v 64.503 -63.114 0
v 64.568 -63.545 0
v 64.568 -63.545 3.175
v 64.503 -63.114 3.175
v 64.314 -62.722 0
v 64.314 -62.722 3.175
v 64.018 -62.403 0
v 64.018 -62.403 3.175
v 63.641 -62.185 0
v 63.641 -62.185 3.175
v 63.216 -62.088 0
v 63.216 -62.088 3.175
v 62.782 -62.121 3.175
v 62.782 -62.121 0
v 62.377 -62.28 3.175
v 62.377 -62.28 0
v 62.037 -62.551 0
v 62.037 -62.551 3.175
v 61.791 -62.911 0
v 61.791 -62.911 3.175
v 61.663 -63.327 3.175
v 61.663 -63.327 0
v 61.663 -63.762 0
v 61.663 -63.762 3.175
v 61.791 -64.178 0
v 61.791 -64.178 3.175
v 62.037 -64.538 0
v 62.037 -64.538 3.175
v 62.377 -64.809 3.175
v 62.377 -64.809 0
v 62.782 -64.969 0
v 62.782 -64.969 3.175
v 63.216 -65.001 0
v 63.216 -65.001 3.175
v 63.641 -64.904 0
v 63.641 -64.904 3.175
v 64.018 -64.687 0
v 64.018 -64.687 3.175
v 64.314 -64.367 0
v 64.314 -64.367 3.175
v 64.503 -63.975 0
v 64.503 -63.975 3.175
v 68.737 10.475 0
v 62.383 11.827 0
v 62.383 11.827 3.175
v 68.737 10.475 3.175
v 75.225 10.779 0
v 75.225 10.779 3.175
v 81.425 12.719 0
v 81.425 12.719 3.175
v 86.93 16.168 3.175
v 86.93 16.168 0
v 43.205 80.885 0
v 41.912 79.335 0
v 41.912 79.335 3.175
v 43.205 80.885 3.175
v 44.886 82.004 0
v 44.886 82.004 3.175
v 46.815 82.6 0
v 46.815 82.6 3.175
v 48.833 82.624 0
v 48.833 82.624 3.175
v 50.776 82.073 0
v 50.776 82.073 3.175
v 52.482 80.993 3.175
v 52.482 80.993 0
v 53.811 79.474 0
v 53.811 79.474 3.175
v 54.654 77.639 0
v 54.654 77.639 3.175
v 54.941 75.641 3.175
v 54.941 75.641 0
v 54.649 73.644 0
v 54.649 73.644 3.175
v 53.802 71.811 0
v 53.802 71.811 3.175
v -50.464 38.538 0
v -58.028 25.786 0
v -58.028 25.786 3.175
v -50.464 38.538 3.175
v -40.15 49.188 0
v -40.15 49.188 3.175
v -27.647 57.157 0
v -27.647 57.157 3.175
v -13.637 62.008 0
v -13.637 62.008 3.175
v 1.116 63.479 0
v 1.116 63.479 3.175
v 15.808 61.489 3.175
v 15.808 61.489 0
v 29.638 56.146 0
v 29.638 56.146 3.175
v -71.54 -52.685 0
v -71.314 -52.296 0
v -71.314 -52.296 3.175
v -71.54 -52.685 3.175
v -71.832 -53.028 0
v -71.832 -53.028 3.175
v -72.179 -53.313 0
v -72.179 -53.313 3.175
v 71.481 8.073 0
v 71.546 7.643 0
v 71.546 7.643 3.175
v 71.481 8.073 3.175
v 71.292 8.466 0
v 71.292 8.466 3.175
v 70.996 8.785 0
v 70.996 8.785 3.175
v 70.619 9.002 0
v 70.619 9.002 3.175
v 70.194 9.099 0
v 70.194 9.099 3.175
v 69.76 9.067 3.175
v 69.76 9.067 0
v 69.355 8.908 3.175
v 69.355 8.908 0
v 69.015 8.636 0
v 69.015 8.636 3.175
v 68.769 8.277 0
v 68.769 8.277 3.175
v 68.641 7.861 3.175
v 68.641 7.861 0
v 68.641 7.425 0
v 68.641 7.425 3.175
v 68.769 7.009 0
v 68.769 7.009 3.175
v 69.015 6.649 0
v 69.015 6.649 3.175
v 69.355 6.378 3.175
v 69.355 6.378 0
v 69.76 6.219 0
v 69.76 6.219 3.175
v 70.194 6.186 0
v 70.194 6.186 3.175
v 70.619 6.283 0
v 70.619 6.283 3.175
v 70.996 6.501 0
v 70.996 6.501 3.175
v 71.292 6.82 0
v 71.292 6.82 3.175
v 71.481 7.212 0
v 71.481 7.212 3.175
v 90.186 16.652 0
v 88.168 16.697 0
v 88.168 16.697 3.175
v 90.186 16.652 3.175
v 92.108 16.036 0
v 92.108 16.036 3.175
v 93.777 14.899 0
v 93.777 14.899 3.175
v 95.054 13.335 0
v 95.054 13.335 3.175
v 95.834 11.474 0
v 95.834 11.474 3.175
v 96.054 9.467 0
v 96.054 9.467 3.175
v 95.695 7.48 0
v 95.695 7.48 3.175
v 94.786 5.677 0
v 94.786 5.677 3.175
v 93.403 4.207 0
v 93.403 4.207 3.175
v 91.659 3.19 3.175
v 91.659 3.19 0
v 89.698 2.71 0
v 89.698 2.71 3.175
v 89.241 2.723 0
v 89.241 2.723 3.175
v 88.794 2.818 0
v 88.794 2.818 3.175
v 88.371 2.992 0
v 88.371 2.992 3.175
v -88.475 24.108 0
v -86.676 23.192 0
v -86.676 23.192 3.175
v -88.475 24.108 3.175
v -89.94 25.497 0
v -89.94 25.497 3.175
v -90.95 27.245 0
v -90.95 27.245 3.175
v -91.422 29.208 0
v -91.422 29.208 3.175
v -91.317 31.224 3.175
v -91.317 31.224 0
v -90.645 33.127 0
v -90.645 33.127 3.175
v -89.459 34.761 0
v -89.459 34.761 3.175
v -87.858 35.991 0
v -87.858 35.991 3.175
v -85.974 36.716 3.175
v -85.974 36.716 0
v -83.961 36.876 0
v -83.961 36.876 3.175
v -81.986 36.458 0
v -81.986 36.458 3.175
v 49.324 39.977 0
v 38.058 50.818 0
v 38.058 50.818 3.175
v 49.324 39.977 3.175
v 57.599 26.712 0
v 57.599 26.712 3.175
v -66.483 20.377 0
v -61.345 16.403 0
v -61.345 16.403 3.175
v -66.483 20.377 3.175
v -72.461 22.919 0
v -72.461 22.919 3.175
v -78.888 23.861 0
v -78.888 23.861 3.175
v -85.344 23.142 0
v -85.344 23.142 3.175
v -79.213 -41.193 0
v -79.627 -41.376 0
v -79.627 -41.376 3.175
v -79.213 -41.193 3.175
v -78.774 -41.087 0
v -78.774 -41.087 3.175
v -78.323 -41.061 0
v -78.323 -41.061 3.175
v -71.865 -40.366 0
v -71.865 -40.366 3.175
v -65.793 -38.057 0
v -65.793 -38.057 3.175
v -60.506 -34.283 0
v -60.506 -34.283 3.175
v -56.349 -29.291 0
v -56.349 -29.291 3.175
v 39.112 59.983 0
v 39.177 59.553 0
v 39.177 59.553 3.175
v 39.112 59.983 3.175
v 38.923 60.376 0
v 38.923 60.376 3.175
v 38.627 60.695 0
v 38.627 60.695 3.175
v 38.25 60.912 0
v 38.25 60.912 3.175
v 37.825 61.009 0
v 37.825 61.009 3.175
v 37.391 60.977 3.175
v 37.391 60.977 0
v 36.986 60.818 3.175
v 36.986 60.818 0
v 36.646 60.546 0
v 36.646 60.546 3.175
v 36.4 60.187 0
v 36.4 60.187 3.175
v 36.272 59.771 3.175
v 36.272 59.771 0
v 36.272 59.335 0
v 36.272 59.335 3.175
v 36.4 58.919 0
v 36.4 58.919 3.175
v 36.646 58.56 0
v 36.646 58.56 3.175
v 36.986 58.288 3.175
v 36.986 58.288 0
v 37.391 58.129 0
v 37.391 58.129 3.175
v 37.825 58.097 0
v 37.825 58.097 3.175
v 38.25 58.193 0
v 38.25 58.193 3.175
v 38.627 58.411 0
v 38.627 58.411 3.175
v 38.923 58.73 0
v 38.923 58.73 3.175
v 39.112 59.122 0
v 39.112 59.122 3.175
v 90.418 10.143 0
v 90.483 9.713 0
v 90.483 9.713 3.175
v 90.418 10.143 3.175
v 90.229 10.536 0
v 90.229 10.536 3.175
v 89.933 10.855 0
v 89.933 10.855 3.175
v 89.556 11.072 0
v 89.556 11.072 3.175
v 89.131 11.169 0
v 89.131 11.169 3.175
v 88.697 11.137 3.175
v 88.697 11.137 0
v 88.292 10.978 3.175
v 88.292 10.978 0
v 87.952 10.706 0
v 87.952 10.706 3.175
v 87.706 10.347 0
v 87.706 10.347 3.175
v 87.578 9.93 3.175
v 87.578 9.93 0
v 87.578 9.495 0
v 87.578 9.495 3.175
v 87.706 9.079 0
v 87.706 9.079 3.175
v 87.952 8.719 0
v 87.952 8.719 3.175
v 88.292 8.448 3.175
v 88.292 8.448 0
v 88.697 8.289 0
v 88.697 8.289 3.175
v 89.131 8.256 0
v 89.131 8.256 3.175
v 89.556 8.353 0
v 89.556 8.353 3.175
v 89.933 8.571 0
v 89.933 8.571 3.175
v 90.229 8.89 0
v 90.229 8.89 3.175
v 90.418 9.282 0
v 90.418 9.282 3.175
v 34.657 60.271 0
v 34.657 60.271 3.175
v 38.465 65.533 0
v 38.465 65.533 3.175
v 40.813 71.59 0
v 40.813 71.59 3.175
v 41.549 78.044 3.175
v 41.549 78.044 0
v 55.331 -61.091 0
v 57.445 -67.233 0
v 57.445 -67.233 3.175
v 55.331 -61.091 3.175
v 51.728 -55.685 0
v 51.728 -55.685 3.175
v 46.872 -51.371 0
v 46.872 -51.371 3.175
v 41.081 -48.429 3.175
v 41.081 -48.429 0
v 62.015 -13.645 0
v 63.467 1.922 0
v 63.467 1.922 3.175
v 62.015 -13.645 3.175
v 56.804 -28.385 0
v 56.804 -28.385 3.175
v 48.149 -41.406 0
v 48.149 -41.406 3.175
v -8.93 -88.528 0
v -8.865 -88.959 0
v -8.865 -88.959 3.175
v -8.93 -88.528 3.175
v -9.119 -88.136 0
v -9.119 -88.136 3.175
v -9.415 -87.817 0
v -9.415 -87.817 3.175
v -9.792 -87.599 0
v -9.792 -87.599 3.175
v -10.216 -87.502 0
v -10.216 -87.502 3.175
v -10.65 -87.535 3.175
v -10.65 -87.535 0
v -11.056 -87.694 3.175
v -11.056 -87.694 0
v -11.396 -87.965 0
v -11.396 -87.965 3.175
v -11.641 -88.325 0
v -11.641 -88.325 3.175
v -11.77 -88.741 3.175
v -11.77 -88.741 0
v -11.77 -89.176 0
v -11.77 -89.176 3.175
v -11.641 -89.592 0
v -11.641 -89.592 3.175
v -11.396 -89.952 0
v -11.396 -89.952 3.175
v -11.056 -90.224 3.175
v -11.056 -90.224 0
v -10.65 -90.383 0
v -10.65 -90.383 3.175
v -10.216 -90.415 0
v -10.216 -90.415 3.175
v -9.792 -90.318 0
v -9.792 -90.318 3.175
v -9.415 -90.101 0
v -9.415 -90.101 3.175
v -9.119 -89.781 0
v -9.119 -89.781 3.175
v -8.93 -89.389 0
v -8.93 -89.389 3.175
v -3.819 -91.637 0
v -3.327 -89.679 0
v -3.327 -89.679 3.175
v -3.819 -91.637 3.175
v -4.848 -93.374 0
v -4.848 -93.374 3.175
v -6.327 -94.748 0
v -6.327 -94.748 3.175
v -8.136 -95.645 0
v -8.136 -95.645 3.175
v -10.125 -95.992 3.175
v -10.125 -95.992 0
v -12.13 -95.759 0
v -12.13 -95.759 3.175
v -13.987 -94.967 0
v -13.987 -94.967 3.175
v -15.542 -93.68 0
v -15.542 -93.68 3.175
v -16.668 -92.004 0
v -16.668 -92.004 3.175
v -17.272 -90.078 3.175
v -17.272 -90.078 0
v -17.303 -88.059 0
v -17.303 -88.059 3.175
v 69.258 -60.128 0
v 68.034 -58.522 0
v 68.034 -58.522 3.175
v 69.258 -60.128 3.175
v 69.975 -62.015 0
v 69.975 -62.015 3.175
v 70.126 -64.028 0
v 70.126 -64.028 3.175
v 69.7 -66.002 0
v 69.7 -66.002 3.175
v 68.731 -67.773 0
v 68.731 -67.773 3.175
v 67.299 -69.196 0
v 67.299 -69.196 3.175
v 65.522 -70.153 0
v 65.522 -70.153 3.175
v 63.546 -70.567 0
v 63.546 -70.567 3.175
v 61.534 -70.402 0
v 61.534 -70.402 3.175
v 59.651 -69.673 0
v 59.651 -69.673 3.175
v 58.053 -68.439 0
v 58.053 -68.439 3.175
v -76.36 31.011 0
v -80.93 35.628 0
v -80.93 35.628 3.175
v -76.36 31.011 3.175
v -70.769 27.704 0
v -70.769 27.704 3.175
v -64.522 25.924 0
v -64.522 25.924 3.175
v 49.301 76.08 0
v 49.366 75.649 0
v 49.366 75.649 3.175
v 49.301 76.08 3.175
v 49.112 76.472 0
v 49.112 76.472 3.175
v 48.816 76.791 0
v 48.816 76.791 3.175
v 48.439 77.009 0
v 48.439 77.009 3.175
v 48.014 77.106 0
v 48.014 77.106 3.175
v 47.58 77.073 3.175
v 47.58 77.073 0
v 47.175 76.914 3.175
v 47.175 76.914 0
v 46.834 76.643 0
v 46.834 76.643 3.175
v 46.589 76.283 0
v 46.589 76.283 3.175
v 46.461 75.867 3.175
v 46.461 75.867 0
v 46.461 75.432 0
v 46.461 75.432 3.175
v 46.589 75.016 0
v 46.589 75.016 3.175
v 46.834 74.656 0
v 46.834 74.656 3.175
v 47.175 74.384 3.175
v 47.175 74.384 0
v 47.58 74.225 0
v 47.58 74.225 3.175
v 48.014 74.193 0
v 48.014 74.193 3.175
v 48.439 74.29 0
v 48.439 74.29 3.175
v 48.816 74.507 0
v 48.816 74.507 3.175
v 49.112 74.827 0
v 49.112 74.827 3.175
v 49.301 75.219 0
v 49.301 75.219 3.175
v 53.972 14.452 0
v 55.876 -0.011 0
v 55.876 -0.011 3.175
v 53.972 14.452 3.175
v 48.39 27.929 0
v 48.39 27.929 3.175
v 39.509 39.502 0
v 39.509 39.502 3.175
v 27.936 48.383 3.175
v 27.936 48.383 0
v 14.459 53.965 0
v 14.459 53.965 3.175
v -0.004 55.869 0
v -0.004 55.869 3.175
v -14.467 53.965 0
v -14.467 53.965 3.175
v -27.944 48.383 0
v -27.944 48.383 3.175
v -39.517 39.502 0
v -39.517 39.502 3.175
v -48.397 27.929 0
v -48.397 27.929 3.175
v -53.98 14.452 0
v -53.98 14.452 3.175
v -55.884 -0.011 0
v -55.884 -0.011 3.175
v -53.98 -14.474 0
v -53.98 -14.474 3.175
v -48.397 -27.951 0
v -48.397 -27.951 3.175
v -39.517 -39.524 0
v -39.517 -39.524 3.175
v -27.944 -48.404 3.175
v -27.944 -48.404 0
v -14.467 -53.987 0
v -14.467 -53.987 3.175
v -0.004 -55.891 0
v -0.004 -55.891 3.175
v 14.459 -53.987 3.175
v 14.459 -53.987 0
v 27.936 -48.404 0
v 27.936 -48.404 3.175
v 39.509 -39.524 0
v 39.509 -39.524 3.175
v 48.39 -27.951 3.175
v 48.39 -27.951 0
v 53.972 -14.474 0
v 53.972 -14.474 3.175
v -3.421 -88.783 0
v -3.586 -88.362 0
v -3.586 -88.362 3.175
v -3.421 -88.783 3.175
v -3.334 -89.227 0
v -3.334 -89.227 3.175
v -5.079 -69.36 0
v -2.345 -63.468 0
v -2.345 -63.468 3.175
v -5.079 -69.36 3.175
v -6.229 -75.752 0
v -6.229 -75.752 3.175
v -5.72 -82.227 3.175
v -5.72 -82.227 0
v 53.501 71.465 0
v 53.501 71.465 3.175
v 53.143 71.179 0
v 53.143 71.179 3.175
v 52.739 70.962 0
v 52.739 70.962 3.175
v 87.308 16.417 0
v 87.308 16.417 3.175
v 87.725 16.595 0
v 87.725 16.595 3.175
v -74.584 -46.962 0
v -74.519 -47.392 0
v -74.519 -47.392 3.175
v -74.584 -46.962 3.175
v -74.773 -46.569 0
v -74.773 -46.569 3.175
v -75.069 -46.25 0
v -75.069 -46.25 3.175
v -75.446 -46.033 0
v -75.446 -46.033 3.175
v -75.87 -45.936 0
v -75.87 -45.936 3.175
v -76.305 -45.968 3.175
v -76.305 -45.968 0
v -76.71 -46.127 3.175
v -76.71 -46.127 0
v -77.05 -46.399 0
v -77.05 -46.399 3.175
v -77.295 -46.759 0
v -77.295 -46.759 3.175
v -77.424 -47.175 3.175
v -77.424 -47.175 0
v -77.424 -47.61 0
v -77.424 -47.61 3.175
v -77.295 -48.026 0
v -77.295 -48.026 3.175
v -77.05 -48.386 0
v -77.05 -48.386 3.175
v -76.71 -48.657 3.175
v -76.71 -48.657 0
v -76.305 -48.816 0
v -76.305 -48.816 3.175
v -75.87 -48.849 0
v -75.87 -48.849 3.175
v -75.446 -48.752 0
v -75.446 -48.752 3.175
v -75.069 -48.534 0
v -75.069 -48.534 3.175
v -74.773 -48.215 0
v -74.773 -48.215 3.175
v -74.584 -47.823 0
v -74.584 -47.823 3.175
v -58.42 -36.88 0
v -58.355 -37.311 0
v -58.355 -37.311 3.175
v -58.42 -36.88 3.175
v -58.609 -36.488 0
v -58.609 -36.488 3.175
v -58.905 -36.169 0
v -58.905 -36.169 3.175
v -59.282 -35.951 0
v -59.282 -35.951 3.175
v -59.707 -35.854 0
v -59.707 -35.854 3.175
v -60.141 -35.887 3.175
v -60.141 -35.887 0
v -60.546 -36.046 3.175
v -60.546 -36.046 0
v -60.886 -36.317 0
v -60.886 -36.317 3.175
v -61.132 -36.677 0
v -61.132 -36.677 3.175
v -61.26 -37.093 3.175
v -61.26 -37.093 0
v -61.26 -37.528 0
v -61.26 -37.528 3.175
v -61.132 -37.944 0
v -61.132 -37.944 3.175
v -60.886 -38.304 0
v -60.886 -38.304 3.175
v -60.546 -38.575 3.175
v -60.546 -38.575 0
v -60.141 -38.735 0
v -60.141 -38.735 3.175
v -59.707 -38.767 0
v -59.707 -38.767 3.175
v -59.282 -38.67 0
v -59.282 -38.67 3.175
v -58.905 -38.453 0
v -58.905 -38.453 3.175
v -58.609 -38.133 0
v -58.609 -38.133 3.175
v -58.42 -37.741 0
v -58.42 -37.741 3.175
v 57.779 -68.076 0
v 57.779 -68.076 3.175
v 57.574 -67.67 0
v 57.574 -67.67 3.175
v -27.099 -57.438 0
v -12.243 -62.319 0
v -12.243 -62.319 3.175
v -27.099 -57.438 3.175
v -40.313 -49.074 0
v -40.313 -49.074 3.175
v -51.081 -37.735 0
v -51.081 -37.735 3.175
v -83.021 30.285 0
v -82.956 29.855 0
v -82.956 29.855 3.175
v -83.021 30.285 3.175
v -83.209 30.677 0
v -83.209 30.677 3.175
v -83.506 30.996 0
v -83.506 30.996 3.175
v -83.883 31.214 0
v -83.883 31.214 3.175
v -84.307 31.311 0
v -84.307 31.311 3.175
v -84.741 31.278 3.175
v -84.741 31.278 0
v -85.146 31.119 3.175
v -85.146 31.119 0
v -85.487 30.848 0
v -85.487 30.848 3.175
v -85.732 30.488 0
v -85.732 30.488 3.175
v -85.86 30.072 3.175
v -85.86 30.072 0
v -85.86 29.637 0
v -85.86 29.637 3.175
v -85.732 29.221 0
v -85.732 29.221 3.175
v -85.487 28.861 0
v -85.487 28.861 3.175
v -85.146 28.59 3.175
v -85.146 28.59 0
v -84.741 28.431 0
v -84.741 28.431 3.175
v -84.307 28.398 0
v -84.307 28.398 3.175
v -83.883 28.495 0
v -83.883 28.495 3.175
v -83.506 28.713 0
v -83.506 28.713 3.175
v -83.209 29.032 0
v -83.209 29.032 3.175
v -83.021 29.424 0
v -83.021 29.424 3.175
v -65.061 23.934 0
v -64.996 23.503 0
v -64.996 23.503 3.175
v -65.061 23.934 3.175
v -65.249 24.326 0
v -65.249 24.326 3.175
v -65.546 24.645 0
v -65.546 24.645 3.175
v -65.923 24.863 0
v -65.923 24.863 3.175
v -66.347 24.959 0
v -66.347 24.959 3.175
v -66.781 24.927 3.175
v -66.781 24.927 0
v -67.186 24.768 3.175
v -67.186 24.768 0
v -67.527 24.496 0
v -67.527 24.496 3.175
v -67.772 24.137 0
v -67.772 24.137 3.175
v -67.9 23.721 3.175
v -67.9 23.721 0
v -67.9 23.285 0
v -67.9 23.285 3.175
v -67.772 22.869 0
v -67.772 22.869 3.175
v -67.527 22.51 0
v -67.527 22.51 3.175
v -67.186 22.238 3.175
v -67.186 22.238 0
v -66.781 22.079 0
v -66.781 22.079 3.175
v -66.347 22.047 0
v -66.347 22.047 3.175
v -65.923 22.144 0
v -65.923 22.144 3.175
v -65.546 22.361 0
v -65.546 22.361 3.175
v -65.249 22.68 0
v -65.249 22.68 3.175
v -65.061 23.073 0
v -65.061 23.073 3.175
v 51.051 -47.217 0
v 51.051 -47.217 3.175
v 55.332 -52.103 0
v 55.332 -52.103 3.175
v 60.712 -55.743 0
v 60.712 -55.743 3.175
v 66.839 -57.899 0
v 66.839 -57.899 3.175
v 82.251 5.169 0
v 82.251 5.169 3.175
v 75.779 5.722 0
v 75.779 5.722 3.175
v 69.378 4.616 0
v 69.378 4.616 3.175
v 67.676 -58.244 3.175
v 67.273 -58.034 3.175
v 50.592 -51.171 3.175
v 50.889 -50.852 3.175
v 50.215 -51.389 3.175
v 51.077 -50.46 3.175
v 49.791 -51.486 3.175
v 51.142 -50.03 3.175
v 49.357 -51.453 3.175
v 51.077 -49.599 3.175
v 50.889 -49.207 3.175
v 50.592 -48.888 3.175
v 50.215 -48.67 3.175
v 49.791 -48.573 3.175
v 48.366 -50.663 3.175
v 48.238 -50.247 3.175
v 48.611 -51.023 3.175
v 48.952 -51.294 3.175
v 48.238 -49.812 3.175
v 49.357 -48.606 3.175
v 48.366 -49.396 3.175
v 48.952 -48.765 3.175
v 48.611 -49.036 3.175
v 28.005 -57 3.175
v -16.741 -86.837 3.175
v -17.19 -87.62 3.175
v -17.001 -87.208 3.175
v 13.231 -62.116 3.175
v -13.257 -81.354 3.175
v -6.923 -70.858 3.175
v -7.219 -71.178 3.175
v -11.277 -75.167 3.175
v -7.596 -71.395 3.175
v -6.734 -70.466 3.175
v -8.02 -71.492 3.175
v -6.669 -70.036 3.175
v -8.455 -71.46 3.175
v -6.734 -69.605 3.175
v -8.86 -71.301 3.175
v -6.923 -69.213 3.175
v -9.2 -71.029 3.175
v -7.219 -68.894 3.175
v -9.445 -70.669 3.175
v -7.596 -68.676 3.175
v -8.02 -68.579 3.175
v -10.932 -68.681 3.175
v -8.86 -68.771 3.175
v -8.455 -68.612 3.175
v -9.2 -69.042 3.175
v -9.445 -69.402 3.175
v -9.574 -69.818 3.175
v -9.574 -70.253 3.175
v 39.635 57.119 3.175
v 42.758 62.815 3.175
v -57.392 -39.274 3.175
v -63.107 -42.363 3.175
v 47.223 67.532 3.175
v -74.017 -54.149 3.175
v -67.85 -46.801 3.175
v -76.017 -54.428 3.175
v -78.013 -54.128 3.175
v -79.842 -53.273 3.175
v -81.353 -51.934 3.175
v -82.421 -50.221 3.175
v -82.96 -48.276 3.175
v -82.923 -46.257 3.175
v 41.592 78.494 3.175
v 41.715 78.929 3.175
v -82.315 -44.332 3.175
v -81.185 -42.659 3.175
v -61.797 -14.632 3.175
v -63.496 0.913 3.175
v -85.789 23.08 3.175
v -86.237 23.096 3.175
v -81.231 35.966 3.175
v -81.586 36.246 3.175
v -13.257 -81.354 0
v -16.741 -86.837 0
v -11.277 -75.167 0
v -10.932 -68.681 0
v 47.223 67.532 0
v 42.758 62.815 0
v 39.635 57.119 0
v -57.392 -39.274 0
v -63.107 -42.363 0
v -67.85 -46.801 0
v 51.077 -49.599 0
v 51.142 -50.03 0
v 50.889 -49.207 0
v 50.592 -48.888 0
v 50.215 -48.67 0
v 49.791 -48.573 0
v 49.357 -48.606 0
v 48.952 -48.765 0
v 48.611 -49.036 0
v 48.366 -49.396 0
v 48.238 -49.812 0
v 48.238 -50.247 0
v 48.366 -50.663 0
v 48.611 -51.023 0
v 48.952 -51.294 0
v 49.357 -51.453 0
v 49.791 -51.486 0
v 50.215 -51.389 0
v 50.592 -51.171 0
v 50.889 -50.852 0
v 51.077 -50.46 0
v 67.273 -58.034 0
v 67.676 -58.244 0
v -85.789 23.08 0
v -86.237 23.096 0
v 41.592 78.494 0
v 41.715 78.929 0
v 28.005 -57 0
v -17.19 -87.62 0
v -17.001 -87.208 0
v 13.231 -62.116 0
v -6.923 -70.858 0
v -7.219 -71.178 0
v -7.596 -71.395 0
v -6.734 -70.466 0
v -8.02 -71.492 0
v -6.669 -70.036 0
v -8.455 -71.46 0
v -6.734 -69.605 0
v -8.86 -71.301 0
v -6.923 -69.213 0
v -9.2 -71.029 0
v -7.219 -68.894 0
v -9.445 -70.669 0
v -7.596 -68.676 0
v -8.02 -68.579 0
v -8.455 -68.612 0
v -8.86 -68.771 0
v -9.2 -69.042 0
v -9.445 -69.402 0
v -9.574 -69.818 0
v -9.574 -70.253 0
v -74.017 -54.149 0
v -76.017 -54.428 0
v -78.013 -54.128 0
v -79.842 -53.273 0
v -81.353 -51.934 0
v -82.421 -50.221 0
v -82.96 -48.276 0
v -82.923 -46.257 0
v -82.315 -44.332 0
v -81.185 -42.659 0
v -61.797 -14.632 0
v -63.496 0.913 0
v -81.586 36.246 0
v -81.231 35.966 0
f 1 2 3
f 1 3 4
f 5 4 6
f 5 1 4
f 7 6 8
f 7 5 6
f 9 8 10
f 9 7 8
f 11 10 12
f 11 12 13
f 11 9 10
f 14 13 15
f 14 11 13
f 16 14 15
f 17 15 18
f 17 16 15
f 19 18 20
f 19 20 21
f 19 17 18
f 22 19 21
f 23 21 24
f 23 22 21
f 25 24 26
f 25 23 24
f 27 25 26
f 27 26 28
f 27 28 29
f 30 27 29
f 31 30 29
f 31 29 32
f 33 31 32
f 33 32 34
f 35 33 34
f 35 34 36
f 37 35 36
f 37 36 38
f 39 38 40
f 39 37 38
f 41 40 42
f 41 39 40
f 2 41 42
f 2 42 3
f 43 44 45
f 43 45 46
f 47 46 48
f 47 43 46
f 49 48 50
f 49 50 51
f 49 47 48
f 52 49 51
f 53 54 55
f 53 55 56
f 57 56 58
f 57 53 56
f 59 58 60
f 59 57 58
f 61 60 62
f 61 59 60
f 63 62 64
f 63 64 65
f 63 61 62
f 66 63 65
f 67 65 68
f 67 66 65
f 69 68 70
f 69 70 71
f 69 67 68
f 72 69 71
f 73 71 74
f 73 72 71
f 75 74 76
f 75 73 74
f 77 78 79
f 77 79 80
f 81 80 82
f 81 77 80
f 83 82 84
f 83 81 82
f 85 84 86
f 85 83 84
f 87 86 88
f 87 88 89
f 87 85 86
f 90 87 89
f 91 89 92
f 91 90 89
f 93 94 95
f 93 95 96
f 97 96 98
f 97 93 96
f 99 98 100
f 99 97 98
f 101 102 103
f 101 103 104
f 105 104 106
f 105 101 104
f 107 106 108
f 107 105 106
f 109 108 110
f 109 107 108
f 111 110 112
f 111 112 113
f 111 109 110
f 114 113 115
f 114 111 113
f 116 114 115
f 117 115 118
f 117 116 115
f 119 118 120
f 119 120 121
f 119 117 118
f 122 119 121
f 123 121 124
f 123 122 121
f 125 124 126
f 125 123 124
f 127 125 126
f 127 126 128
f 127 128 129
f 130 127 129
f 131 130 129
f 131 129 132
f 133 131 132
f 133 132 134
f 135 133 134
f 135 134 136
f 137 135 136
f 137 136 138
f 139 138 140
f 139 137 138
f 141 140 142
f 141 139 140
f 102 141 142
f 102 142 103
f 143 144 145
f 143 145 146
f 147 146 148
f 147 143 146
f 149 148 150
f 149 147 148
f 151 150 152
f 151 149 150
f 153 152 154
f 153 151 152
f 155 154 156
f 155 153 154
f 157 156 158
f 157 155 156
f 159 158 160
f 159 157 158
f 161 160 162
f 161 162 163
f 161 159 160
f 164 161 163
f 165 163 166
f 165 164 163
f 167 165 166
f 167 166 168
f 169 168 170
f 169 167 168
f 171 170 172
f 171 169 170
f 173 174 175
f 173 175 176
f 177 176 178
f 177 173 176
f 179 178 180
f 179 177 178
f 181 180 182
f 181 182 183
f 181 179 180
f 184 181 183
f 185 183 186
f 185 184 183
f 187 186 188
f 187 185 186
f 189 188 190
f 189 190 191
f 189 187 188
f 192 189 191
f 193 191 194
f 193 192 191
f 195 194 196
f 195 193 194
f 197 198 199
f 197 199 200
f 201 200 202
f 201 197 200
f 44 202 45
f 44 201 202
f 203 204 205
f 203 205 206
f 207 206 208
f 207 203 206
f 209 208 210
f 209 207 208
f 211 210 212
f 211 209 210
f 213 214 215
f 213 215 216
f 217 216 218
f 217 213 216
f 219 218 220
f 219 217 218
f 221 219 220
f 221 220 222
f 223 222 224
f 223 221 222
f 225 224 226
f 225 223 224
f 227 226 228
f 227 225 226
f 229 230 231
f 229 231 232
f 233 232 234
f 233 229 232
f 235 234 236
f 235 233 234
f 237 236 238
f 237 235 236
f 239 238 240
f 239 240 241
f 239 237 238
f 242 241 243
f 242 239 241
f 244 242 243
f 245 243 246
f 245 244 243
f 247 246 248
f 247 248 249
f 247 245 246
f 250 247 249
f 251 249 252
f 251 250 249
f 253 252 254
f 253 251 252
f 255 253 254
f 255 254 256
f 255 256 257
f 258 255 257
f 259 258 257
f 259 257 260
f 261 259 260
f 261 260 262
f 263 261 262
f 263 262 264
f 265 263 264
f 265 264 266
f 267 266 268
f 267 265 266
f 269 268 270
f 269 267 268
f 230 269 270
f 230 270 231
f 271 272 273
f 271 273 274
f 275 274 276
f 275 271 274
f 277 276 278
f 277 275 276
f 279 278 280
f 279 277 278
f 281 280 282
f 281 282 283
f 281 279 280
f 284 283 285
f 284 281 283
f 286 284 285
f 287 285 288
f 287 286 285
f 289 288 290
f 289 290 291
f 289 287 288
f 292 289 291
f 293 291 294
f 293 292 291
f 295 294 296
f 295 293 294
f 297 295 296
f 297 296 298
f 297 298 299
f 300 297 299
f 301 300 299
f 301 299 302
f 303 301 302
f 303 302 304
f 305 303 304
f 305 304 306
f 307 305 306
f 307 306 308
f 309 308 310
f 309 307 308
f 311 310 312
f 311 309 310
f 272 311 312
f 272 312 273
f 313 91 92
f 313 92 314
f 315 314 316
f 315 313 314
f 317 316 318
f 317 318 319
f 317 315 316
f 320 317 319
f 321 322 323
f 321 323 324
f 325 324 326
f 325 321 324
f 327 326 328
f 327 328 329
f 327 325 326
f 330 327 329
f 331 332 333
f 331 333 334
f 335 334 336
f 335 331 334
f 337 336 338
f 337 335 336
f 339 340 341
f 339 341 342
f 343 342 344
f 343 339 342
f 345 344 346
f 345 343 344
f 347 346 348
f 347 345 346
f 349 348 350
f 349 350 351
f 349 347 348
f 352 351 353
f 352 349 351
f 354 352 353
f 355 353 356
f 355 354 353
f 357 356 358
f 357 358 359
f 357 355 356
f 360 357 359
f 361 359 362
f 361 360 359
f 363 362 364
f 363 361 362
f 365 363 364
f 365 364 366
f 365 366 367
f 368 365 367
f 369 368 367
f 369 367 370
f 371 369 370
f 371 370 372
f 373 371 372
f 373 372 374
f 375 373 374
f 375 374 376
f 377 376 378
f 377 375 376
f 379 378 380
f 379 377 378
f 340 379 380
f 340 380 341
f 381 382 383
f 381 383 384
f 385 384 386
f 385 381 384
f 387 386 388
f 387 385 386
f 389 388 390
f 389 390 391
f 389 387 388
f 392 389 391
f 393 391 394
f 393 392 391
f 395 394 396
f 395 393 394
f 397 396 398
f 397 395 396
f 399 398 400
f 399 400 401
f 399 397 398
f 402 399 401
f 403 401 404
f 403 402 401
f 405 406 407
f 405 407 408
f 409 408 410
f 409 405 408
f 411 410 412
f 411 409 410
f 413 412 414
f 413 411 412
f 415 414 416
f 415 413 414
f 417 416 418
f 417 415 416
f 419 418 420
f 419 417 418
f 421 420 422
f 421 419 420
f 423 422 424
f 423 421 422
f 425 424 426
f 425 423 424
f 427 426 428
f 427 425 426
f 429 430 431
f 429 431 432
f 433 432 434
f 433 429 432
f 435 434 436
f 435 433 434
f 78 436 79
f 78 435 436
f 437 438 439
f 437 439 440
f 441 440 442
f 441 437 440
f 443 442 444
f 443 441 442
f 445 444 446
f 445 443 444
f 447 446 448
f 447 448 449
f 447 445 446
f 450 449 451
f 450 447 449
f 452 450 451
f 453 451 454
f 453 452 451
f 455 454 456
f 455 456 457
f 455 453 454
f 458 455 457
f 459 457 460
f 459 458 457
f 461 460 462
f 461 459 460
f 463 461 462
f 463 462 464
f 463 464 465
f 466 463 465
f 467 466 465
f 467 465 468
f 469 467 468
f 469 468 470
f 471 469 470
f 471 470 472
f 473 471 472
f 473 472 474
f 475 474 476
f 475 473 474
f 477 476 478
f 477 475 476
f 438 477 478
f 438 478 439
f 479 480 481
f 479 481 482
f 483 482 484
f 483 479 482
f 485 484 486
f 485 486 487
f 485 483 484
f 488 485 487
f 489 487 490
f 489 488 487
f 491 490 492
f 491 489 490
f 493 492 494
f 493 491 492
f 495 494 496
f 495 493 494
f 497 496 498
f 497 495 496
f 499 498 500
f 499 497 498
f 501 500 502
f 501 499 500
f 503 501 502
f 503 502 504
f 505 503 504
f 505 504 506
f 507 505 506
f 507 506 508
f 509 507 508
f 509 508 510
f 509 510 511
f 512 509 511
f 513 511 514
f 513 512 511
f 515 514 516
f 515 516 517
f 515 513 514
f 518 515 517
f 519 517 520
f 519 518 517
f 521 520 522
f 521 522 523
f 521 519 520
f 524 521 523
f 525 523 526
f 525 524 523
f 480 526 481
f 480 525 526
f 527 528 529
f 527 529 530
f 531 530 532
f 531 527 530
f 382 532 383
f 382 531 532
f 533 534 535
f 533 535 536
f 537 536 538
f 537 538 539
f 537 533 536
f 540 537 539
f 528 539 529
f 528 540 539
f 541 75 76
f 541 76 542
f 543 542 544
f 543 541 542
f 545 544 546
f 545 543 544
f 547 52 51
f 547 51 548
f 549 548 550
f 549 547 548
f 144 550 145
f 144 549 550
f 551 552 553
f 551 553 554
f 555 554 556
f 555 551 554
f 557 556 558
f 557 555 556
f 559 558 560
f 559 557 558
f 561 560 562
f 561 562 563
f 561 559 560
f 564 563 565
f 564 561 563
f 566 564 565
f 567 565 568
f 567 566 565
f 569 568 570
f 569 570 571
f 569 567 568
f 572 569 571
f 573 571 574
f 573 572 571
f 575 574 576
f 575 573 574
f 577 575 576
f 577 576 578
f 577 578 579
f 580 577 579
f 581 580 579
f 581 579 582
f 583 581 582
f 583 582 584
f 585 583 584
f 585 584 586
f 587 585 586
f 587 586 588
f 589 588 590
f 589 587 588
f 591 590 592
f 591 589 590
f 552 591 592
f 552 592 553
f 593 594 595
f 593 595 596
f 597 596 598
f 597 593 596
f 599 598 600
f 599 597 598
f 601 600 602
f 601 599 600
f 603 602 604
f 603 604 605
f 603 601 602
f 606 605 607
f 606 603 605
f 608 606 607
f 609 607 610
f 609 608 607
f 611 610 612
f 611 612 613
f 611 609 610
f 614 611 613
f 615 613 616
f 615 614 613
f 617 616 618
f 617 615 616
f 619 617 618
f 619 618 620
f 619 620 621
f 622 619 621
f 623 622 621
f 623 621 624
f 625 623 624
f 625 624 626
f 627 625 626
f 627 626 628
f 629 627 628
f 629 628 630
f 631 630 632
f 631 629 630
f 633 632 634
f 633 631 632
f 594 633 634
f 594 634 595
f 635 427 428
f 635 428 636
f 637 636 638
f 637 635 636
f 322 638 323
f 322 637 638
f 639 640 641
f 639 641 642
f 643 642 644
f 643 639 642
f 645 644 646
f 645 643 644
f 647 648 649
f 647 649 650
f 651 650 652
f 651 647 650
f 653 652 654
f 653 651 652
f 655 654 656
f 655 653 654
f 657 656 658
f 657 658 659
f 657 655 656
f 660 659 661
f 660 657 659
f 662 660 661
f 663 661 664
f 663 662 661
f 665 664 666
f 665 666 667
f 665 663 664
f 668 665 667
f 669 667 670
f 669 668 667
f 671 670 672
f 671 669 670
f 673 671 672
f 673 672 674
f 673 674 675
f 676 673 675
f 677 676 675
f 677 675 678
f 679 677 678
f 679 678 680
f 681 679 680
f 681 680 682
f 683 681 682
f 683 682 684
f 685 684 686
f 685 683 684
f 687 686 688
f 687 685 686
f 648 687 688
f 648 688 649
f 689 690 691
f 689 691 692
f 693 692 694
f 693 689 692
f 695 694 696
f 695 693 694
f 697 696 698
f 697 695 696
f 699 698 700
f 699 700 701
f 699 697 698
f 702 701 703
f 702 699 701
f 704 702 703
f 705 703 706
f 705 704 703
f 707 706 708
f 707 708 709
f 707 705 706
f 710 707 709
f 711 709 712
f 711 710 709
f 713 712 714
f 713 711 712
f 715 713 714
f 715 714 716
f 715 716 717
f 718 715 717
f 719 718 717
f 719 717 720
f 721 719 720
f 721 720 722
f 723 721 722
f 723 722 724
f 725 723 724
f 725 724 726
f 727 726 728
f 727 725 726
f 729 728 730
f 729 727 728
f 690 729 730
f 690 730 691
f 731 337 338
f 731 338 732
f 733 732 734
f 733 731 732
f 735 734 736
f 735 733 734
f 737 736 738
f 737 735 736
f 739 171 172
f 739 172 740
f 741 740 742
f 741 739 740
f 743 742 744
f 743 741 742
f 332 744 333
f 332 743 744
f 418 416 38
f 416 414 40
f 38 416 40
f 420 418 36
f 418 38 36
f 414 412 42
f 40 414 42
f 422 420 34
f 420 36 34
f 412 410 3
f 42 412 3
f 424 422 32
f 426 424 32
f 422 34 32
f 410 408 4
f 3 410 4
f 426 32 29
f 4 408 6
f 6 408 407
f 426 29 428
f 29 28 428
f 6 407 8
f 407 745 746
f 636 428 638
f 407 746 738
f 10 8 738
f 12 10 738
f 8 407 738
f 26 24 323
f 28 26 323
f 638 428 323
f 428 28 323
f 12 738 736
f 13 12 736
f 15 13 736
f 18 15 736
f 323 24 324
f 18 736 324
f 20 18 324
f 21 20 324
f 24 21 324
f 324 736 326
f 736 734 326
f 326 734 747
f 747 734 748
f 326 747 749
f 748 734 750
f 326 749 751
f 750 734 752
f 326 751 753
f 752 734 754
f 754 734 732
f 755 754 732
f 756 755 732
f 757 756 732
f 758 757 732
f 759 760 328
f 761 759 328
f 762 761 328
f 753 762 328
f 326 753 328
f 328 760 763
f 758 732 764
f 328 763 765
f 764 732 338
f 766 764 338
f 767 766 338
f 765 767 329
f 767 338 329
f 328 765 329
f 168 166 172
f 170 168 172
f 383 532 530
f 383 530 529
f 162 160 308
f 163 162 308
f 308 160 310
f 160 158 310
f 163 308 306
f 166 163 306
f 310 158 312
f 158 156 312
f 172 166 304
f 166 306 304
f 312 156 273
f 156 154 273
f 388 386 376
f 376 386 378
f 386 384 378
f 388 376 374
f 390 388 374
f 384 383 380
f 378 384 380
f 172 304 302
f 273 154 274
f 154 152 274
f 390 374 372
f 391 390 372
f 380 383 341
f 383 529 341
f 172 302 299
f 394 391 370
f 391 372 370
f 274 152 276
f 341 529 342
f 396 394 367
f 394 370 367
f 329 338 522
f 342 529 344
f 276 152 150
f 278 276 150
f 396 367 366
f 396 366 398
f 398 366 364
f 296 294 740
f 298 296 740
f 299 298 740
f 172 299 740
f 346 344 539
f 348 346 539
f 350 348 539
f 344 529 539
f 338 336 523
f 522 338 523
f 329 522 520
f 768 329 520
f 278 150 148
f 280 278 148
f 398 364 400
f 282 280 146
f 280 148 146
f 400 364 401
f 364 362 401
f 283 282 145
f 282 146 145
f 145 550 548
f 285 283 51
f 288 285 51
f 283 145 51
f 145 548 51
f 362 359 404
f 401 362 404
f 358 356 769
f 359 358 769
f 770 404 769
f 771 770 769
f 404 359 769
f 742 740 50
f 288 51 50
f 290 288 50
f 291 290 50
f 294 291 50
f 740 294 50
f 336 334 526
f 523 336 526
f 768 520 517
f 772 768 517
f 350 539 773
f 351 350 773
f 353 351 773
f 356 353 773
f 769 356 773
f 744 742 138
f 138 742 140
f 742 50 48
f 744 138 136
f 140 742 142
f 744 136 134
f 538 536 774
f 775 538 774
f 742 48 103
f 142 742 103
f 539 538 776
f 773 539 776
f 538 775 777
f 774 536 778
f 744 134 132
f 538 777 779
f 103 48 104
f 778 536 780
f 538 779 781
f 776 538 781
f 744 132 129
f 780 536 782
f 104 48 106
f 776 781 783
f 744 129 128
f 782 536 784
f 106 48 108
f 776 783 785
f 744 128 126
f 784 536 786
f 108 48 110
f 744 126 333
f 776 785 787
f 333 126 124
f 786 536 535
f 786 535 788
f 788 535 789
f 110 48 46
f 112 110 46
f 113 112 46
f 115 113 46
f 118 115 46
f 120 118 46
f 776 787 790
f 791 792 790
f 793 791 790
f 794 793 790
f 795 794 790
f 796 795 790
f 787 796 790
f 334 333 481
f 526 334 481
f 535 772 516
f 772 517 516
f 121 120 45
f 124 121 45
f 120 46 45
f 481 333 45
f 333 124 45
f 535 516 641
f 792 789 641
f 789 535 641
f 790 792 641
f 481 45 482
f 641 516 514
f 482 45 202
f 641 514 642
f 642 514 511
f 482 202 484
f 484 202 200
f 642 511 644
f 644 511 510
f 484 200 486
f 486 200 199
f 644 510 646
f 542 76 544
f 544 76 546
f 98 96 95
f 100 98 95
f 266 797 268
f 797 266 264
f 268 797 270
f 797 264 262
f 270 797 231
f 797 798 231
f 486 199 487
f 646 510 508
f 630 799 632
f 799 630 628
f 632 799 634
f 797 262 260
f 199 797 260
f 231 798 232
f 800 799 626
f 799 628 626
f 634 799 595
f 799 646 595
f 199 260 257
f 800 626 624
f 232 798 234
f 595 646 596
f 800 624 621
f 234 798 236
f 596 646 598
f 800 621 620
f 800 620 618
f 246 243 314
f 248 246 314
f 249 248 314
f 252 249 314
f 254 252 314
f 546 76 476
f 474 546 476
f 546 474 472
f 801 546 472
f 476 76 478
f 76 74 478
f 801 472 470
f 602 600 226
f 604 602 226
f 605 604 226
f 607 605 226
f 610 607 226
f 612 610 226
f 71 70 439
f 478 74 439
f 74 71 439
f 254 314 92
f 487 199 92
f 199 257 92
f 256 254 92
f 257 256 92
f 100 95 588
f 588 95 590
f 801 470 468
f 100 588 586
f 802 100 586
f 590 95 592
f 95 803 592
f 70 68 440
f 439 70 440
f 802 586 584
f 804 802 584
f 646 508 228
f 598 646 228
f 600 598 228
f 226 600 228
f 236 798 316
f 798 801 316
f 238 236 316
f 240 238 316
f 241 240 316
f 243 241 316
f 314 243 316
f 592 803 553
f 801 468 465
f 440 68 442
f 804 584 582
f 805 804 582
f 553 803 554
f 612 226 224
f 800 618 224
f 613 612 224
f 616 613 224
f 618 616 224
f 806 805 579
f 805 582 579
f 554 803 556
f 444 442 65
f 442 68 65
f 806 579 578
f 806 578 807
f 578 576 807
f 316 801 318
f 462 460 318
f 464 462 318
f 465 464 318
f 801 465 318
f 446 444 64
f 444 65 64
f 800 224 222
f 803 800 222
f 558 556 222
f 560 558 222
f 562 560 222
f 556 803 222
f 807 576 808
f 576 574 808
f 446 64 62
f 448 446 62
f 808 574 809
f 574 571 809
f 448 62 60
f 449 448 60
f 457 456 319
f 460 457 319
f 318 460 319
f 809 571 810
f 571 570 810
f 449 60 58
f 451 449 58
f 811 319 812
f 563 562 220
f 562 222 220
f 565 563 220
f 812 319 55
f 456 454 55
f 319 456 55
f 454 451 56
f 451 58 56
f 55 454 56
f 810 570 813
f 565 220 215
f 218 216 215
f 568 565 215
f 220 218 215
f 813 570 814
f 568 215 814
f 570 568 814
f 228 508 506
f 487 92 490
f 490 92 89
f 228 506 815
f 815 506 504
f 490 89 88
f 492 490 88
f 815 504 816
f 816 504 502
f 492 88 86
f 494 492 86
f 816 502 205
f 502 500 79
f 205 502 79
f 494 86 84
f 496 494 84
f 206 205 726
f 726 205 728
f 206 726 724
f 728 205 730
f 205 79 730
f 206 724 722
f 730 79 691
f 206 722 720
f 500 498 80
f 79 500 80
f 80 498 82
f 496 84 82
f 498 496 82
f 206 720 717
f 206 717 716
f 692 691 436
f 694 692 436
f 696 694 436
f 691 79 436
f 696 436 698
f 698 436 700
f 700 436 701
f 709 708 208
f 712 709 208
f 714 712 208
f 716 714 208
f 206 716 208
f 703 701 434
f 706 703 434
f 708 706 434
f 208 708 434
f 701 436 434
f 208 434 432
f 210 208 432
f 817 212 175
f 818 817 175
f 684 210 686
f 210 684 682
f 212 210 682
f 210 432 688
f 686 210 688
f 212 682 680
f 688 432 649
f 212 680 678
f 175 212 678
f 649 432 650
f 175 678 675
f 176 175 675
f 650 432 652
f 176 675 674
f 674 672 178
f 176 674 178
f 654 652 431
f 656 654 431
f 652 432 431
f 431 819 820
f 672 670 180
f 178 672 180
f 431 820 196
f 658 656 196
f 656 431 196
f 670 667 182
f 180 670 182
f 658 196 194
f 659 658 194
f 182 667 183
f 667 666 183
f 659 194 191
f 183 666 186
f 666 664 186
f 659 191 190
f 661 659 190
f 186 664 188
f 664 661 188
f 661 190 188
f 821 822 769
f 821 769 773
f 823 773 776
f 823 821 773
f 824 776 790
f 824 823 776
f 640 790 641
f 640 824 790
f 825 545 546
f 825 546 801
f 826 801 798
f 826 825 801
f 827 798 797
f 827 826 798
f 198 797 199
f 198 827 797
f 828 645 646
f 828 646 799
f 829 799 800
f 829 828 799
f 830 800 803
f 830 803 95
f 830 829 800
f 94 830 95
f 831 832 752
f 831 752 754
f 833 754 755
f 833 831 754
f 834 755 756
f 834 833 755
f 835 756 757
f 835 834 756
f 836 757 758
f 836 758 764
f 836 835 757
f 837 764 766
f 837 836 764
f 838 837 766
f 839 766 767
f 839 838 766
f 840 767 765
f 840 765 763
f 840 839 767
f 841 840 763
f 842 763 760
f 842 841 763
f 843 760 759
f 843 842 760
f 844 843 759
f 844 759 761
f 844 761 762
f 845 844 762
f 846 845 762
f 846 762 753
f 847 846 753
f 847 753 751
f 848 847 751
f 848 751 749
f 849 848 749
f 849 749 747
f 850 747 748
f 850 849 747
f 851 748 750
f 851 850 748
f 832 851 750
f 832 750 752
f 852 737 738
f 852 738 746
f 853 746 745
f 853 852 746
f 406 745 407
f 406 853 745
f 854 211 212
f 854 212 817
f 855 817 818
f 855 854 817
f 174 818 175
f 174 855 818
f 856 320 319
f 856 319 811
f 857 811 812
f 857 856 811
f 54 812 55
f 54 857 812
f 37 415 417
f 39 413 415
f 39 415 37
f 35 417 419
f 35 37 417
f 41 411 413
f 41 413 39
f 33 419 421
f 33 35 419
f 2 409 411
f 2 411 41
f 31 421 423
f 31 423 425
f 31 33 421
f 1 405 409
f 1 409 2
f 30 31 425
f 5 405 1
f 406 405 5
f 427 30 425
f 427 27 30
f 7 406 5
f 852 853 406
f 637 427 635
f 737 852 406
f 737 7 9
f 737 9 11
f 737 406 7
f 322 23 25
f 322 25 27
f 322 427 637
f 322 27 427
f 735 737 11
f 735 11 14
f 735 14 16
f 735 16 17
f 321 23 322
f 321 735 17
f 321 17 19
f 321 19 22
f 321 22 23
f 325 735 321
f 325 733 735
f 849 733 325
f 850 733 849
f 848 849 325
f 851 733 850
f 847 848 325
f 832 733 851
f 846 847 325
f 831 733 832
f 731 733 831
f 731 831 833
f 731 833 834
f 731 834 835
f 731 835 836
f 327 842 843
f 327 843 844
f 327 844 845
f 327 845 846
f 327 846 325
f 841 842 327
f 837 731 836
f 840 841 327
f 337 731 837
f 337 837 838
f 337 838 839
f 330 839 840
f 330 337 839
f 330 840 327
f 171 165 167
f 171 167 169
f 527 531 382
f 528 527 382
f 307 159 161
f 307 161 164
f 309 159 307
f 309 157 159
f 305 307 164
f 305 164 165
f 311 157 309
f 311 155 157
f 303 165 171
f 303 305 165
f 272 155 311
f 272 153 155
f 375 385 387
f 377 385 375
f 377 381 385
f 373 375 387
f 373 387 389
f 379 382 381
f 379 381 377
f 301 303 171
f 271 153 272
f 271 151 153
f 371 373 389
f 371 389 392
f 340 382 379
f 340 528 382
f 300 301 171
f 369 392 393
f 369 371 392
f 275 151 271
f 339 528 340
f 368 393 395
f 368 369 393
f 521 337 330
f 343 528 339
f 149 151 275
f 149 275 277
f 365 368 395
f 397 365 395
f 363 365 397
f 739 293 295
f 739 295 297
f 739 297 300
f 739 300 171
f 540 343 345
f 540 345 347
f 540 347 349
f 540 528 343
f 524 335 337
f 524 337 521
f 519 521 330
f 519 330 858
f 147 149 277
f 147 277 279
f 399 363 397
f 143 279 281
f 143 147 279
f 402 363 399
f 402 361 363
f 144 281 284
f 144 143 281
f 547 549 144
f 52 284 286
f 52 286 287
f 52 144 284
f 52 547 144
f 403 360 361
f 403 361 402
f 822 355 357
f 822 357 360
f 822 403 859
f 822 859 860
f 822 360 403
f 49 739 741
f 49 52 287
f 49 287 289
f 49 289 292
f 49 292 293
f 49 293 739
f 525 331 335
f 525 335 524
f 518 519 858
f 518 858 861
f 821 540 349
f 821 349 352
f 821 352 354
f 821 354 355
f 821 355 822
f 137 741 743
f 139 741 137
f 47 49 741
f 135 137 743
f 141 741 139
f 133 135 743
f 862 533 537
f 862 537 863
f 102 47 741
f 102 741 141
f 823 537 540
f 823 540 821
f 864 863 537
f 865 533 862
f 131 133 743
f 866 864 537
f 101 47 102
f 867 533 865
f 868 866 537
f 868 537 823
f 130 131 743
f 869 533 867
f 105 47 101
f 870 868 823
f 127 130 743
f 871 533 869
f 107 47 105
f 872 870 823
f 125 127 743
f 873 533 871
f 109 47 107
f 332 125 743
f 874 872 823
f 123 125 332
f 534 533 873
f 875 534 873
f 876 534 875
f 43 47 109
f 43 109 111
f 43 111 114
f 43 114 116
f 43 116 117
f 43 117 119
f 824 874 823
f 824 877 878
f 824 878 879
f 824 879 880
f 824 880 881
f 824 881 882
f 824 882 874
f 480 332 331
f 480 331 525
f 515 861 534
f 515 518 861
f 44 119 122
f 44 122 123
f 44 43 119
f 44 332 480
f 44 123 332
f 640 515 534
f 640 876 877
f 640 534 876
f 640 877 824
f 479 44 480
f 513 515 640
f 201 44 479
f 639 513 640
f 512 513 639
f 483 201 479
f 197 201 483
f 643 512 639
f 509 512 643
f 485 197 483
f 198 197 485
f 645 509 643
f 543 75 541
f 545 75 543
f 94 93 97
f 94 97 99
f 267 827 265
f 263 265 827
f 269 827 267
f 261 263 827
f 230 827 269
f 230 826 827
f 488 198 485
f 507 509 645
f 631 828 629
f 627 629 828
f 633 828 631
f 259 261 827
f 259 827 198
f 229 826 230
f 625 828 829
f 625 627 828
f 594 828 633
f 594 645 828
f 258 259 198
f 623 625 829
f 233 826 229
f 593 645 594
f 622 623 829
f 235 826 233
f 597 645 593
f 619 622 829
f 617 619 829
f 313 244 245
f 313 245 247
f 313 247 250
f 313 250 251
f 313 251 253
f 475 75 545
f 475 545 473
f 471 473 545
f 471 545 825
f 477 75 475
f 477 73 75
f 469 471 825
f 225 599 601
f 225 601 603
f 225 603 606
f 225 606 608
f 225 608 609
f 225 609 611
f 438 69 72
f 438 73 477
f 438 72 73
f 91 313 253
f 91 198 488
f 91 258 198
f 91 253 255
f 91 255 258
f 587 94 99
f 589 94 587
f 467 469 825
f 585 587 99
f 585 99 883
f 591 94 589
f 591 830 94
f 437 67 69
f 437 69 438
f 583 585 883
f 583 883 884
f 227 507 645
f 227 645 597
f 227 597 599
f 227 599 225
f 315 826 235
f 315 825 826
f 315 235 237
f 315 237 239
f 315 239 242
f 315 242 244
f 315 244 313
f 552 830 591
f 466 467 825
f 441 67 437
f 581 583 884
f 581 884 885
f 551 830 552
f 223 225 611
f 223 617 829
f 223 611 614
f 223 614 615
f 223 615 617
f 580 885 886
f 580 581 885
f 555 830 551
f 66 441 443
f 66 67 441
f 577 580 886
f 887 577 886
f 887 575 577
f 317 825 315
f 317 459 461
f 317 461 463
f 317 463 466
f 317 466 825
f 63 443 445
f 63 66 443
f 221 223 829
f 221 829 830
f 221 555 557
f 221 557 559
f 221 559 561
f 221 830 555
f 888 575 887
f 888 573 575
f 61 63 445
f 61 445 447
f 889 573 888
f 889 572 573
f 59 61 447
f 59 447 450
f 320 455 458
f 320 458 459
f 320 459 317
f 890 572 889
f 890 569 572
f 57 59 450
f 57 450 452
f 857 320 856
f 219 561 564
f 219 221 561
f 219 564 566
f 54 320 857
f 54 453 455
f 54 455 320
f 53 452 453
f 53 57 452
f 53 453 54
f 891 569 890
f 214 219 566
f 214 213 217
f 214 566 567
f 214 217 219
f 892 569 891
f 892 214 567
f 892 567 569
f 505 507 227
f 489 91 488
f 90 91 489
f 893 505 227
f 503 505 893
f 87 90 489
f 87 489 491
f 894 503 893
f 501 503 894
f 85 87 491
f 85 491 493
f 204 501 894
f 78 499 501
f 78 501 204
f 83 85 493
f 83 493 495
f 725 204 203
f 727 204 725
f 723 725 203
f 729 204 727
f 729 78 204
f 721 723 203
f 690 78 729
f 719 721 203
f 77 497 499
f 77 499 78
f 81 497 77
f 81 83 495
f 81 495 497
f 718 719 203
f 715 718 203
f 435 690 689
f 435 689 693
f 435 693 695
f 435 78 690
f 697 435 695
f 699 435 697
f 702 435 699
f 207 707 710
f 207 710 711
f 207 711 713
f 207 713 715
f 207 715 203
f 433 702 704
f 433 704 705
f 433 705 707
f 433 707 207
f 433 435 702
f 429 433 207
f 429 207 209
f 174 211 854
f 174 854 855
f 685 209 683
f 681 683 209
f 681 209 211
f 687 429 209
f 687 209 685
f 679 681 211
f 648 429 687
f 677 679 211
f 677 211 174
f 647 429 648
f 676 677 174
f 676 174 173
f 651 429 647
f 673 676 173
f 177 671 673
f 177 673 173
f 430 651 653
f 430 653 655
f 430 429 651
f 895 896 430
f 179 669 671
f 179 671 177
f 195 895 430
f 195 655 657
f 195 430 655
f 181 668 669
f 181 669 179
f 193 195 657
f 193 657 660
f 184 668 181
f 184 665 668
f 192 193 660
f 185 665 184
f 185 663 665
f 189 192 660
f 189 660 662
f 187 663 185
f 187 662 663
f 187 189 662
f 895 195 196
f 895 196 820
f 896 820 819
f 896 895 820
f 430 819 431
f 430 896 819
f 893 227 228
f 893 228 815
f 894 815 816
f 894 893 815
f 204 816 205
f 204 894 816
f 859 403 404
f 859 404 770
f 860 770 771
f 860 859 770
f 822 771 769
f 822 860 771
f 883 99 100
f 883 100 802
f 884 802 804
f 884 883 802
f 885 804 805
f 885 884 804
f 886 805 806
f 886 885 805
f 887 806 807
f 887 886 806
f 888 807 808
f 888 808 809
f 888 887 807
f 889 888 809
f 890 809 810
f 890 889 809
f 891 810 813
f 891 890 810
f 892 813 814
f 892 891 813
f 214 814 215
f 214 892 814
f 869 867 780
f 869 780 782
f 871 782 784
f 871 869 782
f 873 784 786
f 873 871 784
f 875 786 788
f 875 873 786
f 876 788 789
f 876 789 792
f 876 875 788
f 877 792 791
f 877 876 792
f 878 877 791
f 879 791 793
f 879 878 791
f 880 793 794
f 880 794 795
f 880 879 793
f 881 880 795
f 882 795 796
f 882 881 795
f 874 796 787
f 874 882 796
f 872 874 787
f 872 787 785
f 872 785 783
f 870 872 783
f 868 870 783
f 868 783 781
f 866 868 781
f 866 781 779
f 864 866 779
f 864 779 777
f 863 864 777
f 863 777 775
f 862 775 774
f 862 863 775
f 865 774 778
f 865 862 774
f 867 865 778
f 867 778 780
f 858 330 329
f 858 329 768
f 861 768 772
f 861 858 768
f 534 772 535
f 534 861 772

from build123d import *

# Parameters (mm, degrees)
SKETCH1_R           = 1.4605
SKETCH1_R_2         = 55.88
BOSS_EXTRUDE1_DEPTH = 3.175


with BuildPart() as part:
    # Sketch1 → Boss-Extrude1 (new body)
    with BuildSketch(Plane.XY):
        with BuildLine():
            ThreePointArc((88.371221891, 2.992104588), (75.778671602, 5.722307778), (63.466706043, 1.922066166))
            ThreePointArc((63.466706043, 1.922066166), (59.865004486, -21.176198252), (48.149108175, -41.405875631))
            ThreePointArc((48.149108175, -41.405875631), (55.331871693, -52.10275973), (66.839271225, -57.898894408))
            ThreePointArc((66.839271225, -57.898894408), (67.47896866, -58.129774903), (68.034473997, -58.522117141))
            ThreePointArc((68.034473997, -58.522117141), (68.066383731, -68.535675481), (58.053237429, -68.439394687))
            ThreePointArc((58.053237429, -68.439394687), (57.667420479, -67.877380582), (57.444971188, -67.232996469))
            ThreePointArc((57.444971188, -67.232996469), (51.728203311, -55.685490362), (41.080669811, -48.429019967))
            ThreePointArc((41.080669811, -48.429019967), (20.776095309, -60.014628604), (-2.344845215, -63.467769564))
            ThreePointArc((-2.344845215, -63.467769564), (-6.228950943, -75.752050976), (-3.586132247, -88.361783585))
            ThreePointArc((-3.586132247, -88.361783585), (-3.36770111, -89.003157809), (-3.32660045, -89.679459363))
            ThreePointArc((-3.32660045, -89.679459363), (-11.135620218, -95.947758903), (-17.303439466, -88.059135792))
            ThreePointArc((-17.303439466, -88.059135792), (-17.104674606, -87.410023107), (-16.741077367, -86.836741505))
            ThreePointArc((-16.741077367, -86.836741505), (-11.27722002, -75.167440106), (-12.242511565, -62.318527916))
            ThreePointArc((-12.242511565, -62.318527916), (-33.964407462, -53.664473517), (-51.081326085, -37.735113336))
            ThreePointArc((-51.081326085, -37.735113336), (-63.106619809, -42.363141327), (-71.313643792, -52.296473576))
            ThreePointArc((-71.313643792, -52.296473576), (-71.67843667, -52.862852869), (-72.179293677, -53.313409866))
            ThreePointArc((-72.179293677, -53.313409866), (-81.948891787, -51.116293203), (-79.626890286, -41.375621876))
            ThreePointArc((-79.626890286, -41.375621876), (-78.996252753, -41.130558358), (-78.323292008, -41.060675146))
            ThreePointArc((-78.323292008, -41.060675146), (-65.793205462, -38.056800419), (-56.34937083, -29.290939384))
            ThreePointArc((-56.34937083, -29.290939384), (-63.126842761, -6.911975648), (-61.344922052, 16.402760085))
            ThreePointArc((-61.344922052, 16.402760085), (-72.460908038, 22.91898505), (-85.344095674, 23.142163421))
            ThreePointArc((-85.344095674, 23.142163421), (-86.013413894, 23.077972745), (-86.676123345, 23.191654347))
            ThreePointArc((-86.676123345, 23.191654347), (-91.049593156, 32.199713553), (-81.986285397, 36.457508913))
            ThreePointArc((-81.986285397, 36.457508913), (-81.402337069, 36.113799392), (-80.930038908, 35.627932814))
            ThreePointArc((-80.930038908, 35.627932814), (-70.769133899, 27.704401933), (-58.027573187, 25.786339663))
            ThreePointArc((-58.027573187, 25.786339663), (-20.78382715, 59.992758023), (29.638172071, 56.145983995))
            ThreePointArc((29.638172071, 56.145983995), (38.464561255, 65.533272539), (41.548923024, 78.043789903))
            ThreePointArc((41.548923024, 78.043789903), (41.643702385, 78.713927363), (41.912089569, 79.335245044))
            ThreePointArc((41.912089569, 79.335245044), (51.667486511, 81.594581089), (53.801754345, 71.811060778))
            ThreePointArc((53.801754345, 71.811060778), (53.328466449, 71.314142081), (52.739428076, 70.96205769))
            ThreePointArc((52.739428076, 70.96205769), (42.75772259, 62.814605524), (38.058107022, 50.817562776))
            ThreePointArc((38.058107022, 50.817562776), (53.871433145, 33.600106803), (62.38288993, 11.827252681))
            ThreePointArc((62.38288993, 11.827252681), (75.225331292, 10.779382415), (86.929515737, 16.168111273))
            ThreePointArc((86.929515737, 16.168111273), (87.512909807, 16.51581617), (88.167585105, 16.696502613))
            ThreePointArc((88.167585105, 16.696502613), (96.016395661, 10.478099143), (89.698025701, 2.709536219))
            ThreePointArc((89.698025701, 2.709536219), (89.01541073, 2.76060518), (88.371221891, 2.992104588))
        make_face()
        with Locations((-10.325392041, -88.958766705)):
            Circle(SKETCH1_R, mode=Mode.SUBTRACT)
        with Locations((-8.129560177, -70.035743099)):
            Circle(SKETCH1_R, mode=Mode.SUBTRACT)
        with Locations((-75.97950865, -47.392189739)):
            Circle(SKETCH1_R, mode=Mode.SUBTRACT)
        with Locations((-59.815814277, -37.310647981)):
            Circle(SKETCH1_R, mode=Mode.SUBTRACT)
        with Locations((-84.416122315, 29.854602417)):
            Circle(SKETCH1_R, mode=Mode.SUBTRACT)
        with Locations((-66.456156975, 23.503055756)):
            Circle(SKETCH1_R, mode=Mode.SUBTRACT)
        with Locations((47.905086081, 75.649261531)):
            Circle(SKETCH1_R, mode=Mode.SUBTRACT)
        with Locations((37.716317694, 59.552942115)):
            Circle(SKETCH1_R, mode=Mode.SUBTRACT)
        with Locations((89.022339359, 9.712816136)):
            Circle(SKETCH1_R, mode=Mode.SUBTRACT)
        with Locations((70.085136904, 7.642825025)):
            Circle(SKETCH1_R, mode=Mode.SUBTRACT)
        with Locations((63.107338606, -63.544648224)):
            Circle(SKETCH1_R, mode=Mode.SUBTRACT)
        with Locations((49.68180178, -50.029565503)):
            Circle(SKETCH1_R, mode=Mode.SUBTRACT)
        with Locations((-0.003865921, -0.010935291)):
            Circle(SKETCH1_R_2, mode=Mode.SUBTRACT)
    extrude(amount=BOSS_EXTRUDE1_DEPTH)


solid = part.part
